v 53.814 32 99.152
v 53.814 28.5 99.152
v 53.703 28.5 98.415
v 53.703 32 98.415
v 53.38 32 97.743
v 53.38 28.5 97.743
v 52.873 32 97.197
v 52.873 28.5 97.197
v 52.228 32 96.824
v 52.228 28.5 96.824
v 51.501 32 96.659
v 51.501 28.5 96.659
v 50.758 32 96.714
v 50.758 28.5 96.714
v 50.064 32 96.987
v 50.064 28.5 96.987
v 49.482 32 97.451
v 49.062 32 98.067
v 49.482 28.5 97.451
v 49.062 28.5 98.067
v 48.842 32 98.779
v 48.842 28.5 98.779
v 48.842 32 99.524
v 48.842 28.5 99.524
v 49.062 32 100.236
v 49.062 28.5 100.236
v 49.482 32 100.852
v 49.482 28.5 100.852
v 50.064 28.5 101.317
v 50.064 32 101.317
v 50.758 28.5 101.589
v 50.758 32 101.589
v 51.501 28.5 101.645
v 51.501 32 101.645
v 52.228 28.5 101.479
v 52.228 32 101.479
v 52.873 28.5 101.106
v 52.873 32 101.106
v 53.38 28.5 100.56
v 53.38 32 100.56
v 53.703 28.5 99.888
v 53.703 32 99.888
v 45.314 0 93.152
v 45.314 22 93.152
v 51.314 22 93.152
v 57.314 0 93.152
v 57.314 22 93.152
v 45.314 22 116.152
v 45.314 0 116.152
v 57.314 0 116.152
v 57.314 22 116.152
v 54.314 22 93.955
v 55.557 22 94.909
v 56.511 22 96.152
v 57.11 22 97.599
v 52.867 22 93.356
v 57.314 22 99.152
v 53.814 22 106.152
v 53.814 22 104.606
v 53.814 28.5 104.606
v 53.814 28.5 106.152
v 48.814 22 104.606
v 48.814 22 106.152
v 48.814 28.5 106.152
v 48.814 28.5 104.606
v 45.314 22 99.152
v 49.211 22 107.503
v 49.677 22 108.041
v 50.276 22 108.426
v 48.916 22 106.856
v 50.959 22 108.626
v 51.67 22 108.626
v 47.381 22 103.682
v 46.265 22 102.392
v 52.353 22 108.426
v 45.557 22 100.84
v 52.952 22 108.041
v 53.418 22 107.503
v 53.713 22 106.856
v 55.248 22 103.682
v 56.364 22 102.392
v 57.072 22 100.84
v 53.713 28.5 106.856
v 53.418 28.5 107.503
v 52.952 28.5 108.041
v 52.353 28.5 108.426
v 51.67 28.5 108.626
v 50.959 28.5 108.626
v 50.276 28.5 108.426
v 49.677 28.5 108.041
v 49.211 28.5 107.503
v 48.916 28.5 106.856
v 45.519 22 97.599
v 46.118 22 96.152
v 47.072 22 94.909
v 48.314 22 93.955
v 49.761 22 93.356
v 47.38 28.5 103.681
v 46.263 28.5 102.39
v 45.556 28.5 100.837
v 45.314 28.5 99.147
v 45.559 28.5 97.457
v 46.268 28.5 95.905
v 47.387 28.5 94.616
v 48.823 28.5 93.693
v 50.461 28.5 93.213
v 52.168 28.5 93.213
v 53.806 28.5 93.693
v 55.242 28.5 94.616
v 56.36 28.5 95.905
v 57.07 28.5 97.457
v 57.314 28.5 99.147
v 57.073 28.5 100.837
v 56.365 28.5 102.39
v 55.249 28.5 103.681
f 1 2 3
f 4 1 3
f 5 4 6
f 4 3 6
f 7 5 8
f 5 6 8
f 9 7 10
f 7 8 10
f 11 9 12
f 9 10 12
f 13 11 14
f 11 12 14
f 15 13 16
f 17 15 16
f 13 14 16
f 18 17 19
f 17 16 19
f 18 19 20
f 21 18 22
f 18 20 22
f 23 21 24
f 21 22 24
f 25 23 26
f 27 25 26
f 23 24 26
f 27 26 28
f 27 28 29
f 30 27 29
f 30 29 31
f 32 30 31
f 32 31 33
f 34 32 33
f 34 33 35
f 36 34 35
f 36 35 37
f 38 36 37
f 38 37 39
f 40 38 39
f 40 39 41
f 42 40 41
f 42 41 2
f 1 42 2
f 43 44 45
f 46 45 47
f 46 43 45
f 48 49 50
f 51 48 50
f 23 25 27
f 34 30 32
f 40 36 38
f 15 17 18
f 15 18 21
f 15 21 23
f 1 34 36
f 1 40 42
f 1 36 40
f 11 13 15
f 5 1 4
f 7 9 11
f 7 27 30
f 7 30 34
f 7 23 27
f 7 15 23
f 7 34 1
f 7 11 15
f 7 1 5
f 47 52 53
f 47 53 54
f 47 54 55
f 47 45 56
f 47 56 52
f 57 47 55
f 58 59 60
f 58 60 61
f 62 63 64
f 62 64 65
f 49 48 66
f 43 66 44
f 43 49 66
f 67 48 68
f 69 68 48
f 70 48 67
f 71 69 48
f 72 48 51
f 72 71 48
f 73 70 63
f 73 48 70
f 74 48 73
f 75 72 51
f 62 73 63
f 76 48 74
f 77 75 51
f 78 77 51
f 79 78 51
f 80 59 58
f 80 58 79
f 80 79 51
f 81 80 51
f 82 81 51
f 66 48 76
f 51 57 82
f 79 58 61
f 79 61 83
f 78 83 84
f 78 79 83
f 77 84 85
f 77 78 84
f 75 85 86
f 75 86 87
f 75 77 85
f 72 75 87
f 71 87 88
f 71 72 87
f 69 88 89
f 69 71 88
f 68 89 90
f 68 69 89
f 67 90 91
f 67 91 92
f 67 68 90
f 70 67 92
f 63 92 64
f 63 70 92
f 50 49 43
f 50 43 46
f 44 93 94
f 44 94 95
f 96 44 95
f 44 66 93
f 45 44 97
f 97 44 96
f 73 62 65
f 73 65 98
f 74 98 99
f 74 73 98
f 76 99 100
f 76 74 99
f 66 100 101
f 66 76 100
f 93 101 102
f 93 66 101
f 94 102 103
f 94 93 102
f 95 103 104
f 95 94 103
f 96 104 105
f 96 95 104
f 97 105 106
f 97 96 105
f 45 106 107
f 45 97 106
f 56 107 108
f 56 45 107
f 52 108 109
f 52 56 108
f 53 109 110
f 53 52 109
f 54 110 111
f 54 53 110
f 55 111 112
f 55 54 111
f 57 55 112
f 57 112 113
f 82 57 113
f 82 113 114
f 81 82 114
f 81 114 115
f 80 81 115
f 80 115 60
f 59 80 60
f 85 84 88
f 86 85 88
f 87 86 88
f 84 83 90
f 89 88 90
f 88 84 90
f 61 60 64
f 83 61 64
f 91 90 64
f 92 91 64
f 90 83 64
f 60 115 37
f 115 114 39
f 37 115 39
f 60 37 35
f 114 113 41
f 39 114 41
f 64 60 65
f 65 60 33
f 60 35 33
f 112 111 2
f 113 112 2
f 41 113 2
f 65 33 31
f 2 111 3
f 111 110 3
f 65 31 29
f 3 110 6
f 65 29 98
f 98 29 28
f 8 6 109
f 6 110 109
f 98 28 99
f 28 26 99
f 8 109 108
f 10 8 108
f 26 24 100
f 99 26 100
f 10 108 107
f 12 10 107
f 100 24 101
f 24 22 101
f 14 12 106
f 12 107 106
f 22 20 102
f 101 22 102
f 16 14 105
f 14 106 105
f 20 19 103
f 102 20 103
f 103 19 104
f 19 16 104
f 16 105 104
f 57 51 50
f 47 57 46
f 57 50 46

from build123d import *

# Parameters (mm, degrees)
SKETCH4_R           = 2.5
BOSS_EXTRUDE2_DEPTH = 32
BOSS_EXTRUDE3_DEPTH = 28.5
SKETCH1_W           = 12
SKETCH1_H           = 23
BOSS_EXTRUDE4_DEPTH = 22


with BuildPart() as part:
    # Sketch4 → Boss-Extrude2 (new body)
    with BuildSketch(Plane(origin=(0, 0, 0), x_dir=(1, 0, 0), z_dir=(0, 1, 0))):
        with Locations((51.314367453, -99.151596437)):
            Circle(SKETCH4_R)
    extrude(amount=BOSS_EXTRUDE2_DEPTH)

    # Sketch3 → Boss-Extrude3 (add)
    with BuildSketch(Plane(origin=(0, 0, 0), x_dir=(1, 0, 0), z_dir=(0, 1, 0))):
        with BuildLine():
            Line((48.814367453, -106.151596437), (48.814367453, -104.605952495))
            ThreePointArc((48.814367453, -104.605952495), (51.314367453, -93.151596437), (53.814367453, -104.605952495))
            Line((53.814367453, -104.605952495), (53.814367453, -106.151596437))
            ThreePointArc((53.814367453, -106.151596437), (51.314367453, -108.651596437), (48.814367453, -106.151596437))
        make_face()
    extrude(amount=BOSS_EXTRUDE3_DEPTH)

    # Sketch1 → Boss-Extrude4 (add)
    with BuildSketch(Plane(origin=(0, 0, 0), x_dir=(1, 0, 0), z_dir=(0, 1, 0))):
        with Locations((51.314367453, -104.651596437)):
            Rectangle(SKETCH1_W, SKETCH1_H)
    extrude(amount=BOSS_EXTRUDE4_DEPTH)


solid = part.part
